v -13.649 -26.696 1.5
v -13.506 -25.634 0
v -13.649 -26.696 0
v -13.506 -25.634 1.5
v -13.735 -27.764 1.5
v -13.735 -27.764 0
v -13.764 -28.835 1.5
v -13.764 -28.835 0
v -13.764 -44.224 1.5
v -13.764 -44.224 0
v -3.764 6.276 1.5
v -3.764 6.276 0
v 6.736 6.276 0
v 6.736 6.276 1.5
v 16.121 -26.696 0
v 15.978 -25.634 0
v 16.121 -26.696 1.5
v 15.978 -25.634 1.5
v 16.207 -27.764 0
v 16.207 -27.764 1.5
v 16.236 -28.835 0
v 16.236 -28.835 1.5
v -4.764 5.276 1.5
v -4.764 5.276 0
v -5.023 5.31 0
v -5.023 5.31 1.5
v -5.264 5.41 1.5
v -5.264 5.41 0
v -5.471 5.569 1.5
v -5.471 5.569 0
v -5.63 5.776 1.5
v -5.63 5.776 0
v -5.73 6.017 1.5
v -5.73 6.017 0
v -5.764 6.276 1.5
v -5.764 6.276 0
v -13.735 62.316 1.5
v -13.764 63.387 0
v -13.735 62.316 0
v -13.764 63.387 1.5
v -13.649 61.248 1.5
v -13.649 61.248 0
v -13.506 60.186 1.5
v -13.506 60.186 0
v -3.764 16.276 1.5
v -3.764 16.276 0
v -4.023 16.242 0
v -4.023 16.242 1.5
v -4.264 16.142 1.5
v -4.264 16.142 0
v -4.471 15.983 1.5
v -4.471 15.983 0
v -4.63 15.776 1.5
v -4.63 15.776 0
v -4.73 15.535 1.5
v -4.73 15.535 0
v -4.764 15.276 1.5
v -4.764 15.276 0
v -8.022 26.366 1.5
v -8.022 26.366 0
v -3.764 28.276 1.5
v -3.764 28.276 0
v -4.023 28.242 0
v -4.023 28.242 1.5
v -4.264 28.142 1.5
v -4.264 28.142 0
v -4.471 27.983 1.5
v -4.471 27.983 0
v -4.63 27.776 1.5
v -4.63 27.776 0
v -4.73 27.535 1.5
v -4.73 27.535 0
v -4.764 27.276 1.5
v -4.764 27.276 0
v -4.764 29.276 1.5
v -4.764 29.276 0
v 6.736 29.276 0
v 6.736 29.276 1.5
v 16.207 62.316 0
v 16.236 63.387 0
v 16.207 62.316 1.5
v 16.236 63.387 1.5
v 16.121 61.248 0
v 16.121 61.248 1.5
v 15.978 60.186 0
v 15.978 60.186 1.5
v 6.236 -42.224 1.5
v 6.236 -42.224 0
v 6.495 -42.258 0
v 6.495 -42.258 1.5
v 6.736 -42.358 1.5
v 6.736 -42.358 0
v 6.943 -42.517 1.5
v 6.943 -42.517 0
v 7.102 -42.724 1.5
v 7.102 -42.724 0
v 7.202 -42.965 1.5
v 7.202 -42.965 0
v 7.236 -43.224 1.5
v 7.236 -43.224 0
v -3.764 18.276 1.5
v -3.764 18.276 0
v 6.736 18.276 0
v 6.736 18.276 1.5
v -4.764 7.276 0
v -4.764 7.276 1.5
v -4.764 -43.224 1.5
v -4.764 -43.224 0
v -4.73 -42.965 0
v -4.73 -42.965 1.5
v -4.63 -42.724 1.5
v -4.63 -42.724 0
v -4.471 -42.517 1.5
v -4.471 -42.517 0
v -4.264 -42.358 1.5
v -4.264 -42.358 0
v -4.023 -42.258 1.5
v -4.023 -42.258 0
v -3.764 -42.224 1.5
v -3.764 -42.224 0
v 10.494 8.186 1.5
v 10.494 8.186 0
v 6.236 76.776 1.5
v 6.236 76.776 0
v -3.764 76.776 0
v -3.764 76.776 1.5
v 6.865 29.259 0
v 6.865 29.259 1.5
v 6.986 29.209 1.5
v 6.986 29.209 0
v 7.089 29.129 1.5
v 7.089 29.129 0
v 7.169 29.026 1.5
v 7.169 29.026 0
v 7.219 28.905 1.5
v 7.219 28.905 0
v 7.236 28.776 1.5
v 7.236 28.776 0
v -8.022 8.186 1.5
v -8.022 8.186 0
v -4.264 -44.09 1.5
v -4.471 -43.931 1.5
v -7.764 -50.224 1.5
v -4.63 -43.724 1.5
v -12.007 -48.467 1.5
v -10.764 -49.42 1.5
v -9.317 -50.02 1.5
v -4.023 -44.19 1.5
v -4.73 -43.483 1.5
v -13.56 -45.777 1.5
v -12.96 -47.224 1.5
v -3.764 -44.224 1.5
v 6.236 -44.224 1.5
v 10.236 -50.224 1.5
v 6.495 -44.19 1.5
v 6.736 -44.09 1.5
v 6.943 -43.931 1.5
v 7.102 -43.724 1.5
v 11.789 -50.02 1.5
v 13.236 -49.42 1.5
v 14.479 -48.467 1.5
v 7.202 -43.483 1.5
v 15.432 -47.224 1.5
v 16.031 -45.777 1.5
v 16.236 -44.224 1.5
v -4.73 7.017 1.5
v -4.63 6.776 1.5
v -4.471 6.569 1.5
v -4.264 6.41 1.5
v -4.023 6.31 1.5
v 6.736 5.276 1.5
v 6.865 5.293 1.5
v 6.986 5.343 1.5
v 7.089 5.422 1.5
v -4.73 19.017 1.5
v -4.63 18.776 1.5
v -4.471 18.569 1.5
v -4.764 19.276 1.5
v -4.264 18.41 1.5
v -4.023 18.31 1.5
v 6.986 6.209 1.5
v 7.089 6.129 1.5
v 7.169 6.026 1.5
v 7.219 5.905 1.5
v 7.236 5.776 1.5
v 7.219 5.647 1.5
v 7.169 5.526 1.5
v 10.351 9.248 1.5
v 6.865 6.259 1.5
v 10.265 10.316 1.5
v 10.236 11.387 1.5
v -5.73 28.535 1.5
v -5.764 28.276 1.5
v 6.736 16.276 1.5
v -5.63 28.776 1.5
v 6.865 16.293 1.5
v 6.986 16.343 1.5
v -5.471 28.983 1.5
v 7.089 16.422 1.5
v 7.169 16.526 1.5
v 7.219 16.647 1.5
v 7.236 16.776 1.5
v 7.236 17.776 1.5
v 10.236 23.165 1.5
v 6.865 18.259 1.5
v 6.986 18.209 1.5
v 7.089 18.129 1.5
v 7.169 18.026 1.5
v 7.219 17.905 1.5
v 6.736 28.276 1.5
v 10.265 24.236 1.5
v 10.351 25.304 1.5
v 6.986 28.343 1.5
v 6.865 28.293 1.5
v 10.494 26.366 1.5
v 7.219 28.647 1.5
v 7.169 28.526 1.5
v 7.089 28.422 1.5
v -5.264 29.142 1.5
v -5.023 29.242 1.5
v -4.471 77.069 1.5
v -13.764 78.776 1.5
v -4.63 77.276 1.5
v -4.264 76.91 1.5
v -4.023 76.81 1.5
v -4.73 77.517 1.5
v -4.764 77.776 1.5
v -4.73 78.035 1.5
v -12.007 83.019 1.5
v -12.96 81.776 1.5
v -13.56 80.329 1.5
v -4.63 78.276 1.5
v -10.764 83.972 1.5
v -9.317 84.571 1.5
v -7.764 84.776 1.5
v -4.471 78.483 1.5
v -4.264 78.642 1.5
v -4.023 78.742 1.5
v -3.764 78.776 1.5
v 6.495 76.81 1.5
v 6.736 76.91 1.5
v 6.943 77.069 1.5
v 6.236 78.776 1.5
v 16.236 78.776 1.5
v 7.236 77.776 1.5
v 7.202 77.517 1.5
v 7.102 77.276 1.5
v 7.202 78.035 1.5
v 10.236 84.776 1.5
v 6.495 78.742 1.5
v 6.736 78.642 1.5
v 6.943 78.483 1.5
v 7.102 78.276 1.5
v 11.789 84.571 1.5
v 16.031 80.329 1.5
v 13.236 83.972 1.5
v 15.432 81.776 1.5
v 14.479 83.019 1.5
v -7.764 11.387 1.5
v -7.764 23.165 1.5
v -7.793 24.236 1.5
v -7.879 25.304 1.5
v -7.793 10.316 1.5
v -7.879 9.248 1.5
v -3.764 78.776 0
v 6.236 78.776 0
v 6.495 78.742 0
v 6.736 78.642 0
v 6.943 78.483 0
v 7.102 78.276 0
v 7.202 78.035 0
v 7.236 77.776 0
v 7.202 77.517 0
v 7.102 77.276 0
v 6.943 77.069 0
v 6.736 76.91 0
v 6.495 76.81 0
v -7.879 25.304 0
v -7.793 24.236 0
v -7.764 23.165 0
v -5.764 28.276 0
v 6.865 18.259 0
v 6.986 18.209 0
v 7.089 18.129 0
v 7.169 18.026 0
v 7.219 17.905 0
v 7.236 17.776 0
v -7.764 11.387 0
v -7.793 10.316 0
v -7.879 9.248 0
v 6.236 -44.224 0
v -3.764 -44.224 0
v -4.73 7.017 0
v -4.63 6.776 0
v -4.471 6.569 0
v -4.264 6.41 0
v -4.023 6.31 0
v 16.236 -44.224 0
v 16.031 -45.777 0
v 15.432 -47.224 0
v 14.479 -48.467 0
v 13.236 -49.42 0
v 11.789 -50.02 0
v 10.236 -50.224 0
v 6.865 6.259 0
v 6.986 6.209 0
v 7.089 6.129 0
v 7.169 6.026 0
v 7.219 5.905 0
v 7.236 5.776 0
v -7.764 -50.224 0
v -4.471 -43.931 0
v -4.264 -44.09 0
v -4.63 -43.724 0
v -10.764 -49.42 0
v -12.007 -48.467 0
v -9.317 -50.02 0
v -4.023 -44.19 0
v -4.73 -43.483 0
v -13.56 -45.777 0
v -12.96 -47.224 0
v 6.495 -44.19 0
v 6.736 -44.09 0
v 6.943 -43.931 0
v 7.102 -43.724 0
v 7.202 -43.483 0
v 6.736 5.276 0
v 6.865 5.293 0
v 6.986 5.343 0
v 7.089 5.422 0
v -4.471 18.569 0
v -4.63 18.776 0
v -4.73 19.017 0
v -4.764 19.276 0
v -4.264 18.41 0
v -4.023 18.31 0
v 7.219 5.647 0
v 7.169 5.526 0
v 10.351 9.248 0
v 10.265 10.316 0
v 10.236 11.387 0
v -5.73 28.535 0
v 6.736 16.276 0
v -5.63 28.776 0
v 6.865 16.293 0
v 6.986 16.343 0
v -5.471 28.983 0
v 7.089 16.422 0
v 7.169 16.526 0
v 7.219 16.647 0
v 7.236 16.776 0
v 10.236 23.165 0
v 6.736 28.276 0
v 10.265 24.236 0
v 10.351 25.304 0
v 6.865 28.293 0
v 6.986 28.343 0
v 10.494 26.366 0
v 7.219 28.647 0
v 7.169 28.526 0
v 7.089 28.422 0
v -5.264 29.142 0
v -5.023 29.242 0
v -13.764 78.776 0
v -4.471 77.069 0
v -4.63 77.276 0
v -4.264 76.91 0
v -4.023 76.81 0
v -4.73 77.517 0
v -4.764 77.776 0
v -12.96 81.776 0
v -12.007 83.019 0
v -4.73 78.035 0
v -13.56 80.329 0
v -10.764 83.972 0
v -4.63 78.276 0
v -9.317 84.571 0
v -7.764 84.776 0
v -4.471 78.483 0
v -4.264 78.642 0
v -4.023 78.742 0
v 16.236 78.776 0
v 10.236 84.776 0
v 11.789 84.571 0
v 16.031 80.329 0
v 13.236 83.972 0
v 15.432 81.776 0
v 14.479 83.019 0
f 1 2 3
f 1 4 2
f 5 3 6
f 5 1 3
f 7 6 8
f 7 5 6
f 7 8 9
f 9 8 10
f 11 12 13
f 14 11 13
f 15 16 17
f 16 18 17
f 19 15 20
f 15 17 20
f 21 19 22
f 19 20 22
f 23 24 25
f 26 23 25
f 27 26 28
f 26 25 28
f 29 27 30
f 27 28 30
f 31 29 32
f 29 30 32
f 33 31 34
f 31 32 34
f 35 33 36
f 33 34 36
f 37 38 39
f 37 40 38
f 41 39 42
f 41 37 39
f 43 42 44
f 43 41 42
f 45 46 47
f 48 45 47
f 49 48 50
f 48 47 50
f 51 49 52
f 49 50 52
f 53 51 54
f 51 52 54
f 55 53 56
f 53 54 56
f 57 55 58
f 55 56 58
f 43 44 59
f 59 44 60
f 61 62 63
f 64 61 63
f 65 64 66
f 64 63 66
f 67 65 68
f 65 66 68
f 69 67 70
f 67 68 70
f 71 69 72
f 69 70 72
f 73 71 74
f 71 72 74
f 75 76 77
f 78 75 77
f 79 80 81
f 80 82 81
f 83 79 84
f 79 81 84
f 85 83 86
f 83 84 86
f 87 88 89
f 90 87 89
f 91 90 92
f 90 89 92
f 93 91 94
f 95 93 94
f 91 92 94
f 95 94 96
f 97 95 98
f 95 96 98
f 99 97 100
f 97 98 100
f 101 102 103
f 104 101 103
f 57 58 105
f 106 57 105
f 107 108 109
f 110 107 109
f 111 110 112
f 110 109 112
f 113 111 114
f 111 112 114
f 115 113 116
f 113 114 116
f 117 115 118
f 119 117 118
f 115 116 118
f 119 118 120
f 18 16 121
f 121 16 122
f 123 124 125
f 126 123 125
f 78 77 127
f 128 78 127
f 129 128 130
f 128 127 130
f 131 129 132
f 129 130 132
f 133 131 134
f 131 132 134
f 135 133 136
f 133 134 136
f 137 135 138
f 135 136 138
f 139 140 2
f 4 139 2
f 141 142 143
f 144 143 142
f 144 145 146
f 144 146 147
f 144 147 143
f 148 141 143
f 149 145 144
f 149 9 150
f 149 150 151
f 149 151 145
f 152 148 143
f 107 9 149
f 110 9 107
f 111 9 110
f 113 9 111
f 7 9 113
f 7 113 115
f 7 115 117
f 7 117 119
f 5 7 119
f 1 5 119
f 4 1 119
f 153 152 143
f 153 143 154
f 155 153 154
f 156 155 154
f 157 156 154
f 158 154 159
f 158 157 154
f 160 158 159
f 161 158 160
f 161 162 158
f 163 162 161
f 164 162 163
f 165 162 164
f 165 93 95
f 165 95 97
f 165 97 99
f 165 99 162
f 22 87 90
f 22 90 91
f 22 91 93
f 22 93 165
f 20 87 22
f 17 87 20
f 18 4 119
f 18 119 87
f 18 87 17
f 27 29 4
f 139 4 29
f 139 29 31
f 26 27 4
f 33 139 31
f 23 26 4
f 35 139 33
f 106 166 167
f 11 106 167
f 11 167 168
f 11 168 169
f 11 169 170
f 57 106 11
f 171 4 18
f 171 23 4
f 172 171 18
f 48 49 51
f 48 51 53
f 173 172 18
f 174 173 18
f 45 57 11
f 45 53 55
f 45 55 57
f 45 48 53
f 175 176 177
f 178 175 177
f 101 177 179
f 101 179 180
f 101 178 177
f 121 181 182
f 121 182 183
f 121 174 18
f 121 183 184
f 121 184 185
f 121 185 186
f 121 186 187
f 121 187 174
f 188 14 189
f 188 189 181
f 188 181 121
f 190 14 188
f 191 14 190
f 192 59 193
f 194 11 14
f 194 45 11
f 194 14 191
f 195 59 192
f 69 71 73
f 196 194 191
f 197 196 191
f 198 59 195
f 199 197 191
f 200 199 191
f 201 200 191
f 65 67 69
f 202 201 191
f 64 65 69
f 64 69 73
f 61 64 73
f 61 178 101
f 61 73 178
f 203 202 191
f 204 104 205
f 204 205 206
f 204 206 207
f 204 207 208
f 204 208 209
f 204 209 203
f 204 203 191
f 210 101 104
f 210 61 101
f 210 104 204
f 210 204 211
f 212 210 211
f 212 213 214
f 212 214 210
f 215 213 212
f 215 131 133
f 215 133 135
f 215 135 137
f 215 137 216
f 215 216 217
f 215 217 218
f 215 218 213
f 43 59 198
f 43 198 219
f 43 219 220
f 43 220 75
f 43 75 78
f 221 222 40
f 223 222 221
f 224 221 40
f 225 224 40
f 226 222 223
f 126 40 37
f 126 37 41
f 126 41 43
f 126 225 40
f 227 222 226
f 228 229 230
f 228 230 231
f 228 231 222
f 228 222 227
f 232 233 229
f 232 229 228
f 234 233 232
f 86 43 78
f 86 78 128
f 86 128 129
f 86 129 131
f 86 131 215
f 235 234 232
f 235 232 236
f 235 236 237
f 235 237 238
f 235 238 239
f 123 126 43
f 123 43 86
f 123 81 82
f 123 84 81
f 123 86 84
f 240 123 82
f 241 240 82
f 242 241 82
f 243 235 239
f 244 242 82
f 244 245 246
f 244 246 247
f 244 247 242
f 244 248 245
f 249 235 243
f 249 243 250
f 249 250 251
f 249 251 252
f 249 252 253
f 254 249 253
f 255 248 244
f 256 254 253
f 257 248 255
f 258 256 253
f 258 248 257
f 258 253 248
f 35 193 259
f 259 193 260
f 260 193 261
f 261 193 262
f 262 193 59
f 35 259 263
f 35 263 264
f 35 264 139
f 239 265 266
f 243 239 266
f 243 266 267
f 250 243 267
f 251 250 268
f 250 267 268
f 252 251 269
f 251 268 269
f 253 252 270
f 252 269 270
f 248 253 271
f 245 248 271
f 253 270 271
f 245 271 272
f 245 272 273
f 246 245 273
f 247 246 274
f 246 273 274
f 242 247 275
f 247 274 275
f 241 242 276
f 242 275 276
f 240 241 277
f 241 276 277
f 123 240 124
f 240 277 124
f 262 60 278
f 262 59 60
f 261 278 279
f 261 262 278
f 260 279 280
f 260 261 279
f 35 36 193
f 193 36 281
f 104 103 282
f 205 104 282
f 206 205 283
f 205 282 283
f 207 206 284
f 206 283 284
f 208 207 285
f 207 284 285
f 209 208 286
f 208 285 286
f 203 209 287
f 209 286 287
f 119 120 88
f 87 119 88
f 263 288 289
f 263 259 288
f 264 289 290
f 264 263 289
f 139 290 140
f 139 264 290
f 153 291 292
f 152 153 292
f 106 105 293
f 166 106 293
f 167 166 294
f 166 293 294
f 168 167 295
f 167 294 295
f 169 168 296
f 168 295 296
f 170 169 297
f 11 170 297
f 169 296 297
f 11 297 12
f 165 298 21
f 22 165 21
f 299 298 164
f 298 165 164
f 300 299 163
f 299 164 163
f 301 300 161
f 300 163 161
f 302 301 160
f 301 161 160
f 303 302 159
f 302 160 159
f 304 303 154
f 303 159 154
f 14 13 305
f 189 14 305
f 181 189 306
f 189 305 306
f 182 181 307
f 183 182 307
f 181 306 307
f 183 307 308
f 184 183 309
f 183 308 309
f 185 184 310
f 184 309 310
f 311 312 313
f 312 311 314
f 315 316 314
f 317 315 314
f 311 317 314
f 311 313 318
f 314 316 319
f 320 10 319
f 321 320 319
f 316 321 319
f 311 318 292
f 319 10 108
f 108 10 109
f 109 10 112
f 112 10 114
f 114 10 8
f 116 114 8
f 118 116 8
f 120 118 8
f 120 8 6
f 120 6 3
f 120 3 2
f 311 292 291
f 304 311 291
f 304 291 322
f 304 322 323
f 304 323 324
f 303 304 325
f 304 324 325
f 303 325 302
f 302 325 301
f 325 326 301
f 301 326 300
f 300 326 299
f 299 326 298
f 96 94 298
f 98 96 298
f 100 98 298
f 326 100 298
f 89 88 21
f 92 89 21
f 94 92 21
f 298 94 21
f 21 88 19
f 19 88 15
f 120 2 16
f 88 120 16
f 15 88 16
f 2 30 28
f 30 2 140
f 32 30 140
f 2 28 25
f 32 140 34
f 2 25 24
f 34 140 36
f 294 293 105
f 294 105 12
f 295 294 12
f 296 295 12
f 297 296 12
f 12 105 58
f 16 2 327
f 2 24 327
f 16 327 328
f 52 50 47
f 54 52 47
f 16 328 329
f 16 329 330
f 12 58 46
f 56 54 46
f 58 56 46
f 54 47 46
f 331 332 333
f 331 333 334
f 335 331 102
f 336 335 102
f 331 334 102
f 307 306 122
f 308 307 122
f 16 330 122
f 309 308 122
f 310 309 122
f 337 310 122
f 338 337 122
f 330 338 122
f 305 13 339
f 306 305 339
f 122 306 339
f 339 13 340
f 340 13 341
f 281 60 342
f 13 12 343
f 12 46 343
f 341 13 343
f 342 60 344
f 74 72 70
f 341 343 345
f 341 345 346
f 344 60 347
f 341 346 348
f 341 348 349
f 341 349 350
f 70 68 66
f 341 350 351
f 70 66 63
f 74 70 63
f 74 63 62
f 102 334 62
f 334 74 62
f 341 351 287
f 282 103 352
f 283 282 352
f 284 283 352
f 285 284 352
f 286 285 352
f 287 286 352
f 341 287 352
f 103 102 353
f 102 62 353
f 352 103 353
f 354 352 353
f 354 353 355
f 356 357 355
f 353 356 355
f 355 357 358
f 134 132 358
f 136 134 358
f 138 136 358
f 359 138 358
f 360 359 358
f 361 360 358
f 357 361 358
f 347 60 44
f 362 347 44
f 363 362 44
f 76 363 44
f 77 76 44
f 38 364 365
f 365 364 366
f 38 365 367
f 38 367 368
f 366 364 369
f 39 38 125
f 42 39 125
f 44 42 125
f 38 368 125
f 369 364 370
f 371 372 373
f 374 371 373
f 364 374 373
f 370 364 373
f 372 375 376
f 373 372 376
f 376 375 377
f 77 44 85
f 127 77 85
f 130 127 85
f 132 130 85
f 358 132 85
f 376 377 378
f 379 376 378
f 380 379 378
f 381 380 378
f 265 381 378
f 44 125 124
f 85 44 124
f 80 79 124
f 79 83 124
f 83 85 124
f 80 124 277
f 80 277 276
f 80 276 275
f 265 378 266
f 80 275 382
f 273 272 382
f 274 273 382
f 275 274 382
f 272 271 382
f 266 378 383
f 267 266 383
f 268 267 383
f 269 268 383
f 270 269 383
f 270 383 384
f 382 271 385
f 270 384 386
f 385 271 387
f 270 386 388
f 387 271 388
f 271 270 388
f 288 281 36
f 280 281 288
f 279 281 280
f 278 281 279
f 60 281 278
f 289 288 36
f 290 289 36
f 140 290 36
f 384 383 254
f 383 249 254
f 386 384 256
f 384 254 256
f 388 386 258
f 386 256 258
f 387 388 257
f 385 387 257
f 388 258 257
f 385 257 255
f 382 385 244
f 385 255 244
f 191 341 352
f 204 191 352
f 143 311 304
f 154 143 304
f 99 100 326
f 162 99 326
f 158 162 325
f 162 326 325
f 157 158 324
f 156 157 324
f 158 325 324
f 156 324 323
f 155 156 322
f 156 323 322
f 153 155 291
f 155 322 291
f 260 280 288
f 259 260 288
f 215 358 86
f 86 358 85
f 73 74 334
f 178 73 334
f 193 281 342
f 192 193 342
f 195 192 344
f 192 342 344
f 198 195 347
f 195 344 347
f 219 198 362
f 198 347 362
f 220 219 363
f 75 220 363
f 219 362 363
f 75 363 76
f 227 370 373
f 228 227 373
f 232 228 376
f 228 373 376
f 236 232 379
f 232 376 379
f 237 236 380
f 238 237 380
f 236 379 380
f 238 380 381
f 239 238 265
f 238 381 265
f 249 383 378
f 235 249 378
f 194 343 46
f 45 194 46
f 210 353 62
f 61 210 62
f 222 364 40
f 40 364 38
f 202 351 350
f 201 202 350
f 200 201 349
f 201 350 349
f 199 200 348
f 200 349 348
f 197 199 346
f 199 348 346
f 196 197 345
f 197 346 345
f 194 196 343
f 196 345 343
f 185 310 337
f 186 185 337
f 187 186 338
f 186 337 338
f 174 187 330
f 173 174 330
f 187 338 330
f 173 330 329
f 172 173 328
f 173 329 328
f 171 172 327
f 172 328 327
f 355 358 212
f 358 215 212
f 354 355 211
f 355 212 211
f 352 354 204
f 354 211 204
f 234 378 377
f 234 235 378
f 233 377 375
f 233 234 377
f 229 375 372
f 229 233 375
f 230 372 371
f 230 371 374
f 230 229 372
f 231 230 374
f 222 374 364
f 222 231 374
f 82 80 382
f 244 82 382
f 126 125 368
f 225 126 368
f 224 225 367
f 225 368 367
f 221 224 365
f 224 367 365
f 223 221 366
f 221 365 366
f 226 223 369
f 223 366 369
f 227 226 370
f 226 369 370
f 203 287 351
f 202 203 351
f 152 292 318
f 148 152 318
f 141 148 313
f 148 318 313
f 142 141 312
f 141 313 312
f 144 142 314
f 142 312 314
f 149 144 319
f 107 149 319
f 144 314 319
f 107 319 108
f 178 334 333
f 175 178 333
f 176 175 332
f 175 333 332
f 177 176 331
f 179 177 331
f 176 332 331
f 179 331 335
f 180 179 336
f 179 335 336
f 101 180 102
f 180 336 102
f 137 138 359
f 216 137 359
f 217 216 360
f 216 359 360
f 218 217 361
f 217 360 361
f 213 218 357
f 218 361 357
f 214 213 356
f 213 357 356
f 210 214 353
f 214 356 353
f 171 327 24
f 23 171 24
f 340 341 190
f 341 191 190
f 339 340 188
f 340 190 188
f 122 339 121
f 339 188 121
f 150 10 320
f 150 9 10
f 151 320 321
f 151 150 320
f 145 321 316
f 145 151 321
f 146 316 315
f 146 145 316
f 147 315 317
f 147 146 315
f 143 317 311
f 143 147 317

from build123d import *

# Parameters (mm, degrees)
F1_DEPTH = 1.5
F2_R     = 6
F3_R     = 20


with BuildPart() as f1:
    # F0 (on Top) → F1 (new body)
    with BuildSketch(Plane.XY):
        Polygon((16.235917, 84.775943), (-13.764083, 84.775943), (-13.764083, 61.775943), (-7.764083, 24.775943), (-7.764083, 9.775943), (-13.764083, -27.224057), (-13.764083, -50.224057), (16.235917, -50.224057), (16.235917, -27.224057), (10.235917, 9.775943), (10.235917, 24.775943), (16.235917, 61.775943), align=None)
        with BuildLine():
            ThreePointArc((-4.764083, -43.224057), (-4.471189, -42.51695), (-3.764083, -42.224057))
            Line((-3.764083, -42.224057), (6.235917, -42.224057))
            ThreePointArc((6.235917, -42.224057), (6.943024, -42.51695), (7.235917, -43.224057))
            ThreePointArc((7.235917, -43.224057), (6.943024, -43.931164), (6.235917, -44.224057))
            Line((6.235917, -44.224057), (-3.764083, -44.224057))
            ThreePointArc((-3.764083, -44.224057), (-4.471189, -43.931164), (-4.764083, -43.224057))
        make_face(mode=Mode.SUBTRACT)
        with BuildLine():
            Line((6.735917, 28.275943), (-3.764083, 28.275943))
            ThreePointArc((-3.764083, 28.275943), (-4.471189, 27.98305), (-4.764083, 27.275943))
            Line((-4.764083, 27.275943), (-4.764083, 19.275943))
            ThreePointArc((-4.764083, 19.275943), (-4.471189, 18.568836), (-3.764083, 18.275943))
            Line((-3.764083, 18.275943), (6.735917, 18.275943))
            ThreePointArc((6.735917, 18.275943), (7.089471, 18.129496), (7.235917, 17.775943))
            Line((7.235917, 17.775943), (7.235917, 17.275943))
            Line((7.235917, 17.275943), (7.235917, 16.775943))
            ThreePointArc((7.235917, 16.775943), (7.089471, 16.42239), (6.735917, 16.275943))
            Line((6.735917, 16.275943), (-3.764083, 16.275943))
            ThreePointArc((-3.764083, 16.275943), (-4.471189, 15.98305), (-4.764083, 15.275943))
            Line((-4.764083, 15.275943), (-4.764083, 7.275943))
            ThreePointArc((-4.764083, 7.275943), (-4.471189, 6.568836), (-3.764083, 6.275943))
            Line((-3.764083, 6.275943), (6.735917, 6.275943))
            ThreePointArc((6.735917, 6.275943), (7.089471, 6.129496), (7.235917, 5.775943))
            ThreePointArc((7.235917, 5.775943), (7.089471, 5.42239), (6.735917, 5.275943))
            Line((6.735917, 5.275943), (-4.764083, 5.275943))
            ThreePointArc((-4.764083, 5.275943), (-5.471189, 5.568836), (-5.764083, 6.275943))
            Line((-5.764083, 6.275943), (-5.764083, 16.775943))
            Line((-5.764083, 16.775943), (-5.764083, 17.775943))
            Line((-5.764083, 17.775943), (-5.764083, 28.275943))
            ThreePointArc((-5.764083, 28.275943), (-5.471189, 28.98305), (-4.764083, 29.275943))
            Line((-4.764083, 29.275943), (6.735917, 29.275943))
            ThreePointArc((6.735917, 29.275943), (7.089471, 29.129496), (7.235917, 28.775943))
            ThreePointArc((7.235917, 28.775943), (7.089471, 28.42239), (6.735917, 28.275943))
        make_face(mode=Mode.SUBTRACT)
        with BuildLine():
            Line((6.235917, 76.775943), (-3.764083, 76.775943))
            ThreePointArc((-3.764083, 76.775943), (-4.471189, 77.068836), (-4.764083, 77.775943))
            ThreePointArc((-4.764083, 77.775943), (-4.471189, 78.48305), (-3.764083, 78.775943))
            Line((-3.764083, 78.775943), (6.235917, 78.775943))
            ThreePointArc((6.235917, 78.775943), (6.943024, 78.48305), (7.235917, 77.775943))
            ThreePointArc((7.235917, 77.775943), (6.943024, 77.068836), (6.235917, 76.775943))
        make_face(mode=Mode.SUBTRACT)
    extrude(amount=F1_DEPTH)

    # F2
    f2_edges = [f1.edges().sort_by_distance(p)[0] for p in [
        (16.235917, 84.775943, 0.75),
        (-13.764083, 84.775943, 0.75),
        (-13.764083, -50.224057, 0.75),
        (16.235917, -50.224057, 0.75),
    ]]
    fillet(f2_edges, radius=F2_R)

    # F3
    f3_edges = [f1.edges().sort_by_distance(p)[0] for p in [
        (16.235917, 61.775943, 0.75),
        (-13.764083, 61.775943, 0.75),
        (16.235917, -27.224057, 0.75),
        (-13.764083, -27.224057, 0.75),
        (-7.764083, 9.775943, 0.75),
        (10.235917, 9.775943, 0.75),
        (10.235917, 24.775943, 0.75),
        (-7.764083, 24.775943, 0.75),
    ]]
    fillet(f3_edges, radius=F3_R)


solid = f1.part
